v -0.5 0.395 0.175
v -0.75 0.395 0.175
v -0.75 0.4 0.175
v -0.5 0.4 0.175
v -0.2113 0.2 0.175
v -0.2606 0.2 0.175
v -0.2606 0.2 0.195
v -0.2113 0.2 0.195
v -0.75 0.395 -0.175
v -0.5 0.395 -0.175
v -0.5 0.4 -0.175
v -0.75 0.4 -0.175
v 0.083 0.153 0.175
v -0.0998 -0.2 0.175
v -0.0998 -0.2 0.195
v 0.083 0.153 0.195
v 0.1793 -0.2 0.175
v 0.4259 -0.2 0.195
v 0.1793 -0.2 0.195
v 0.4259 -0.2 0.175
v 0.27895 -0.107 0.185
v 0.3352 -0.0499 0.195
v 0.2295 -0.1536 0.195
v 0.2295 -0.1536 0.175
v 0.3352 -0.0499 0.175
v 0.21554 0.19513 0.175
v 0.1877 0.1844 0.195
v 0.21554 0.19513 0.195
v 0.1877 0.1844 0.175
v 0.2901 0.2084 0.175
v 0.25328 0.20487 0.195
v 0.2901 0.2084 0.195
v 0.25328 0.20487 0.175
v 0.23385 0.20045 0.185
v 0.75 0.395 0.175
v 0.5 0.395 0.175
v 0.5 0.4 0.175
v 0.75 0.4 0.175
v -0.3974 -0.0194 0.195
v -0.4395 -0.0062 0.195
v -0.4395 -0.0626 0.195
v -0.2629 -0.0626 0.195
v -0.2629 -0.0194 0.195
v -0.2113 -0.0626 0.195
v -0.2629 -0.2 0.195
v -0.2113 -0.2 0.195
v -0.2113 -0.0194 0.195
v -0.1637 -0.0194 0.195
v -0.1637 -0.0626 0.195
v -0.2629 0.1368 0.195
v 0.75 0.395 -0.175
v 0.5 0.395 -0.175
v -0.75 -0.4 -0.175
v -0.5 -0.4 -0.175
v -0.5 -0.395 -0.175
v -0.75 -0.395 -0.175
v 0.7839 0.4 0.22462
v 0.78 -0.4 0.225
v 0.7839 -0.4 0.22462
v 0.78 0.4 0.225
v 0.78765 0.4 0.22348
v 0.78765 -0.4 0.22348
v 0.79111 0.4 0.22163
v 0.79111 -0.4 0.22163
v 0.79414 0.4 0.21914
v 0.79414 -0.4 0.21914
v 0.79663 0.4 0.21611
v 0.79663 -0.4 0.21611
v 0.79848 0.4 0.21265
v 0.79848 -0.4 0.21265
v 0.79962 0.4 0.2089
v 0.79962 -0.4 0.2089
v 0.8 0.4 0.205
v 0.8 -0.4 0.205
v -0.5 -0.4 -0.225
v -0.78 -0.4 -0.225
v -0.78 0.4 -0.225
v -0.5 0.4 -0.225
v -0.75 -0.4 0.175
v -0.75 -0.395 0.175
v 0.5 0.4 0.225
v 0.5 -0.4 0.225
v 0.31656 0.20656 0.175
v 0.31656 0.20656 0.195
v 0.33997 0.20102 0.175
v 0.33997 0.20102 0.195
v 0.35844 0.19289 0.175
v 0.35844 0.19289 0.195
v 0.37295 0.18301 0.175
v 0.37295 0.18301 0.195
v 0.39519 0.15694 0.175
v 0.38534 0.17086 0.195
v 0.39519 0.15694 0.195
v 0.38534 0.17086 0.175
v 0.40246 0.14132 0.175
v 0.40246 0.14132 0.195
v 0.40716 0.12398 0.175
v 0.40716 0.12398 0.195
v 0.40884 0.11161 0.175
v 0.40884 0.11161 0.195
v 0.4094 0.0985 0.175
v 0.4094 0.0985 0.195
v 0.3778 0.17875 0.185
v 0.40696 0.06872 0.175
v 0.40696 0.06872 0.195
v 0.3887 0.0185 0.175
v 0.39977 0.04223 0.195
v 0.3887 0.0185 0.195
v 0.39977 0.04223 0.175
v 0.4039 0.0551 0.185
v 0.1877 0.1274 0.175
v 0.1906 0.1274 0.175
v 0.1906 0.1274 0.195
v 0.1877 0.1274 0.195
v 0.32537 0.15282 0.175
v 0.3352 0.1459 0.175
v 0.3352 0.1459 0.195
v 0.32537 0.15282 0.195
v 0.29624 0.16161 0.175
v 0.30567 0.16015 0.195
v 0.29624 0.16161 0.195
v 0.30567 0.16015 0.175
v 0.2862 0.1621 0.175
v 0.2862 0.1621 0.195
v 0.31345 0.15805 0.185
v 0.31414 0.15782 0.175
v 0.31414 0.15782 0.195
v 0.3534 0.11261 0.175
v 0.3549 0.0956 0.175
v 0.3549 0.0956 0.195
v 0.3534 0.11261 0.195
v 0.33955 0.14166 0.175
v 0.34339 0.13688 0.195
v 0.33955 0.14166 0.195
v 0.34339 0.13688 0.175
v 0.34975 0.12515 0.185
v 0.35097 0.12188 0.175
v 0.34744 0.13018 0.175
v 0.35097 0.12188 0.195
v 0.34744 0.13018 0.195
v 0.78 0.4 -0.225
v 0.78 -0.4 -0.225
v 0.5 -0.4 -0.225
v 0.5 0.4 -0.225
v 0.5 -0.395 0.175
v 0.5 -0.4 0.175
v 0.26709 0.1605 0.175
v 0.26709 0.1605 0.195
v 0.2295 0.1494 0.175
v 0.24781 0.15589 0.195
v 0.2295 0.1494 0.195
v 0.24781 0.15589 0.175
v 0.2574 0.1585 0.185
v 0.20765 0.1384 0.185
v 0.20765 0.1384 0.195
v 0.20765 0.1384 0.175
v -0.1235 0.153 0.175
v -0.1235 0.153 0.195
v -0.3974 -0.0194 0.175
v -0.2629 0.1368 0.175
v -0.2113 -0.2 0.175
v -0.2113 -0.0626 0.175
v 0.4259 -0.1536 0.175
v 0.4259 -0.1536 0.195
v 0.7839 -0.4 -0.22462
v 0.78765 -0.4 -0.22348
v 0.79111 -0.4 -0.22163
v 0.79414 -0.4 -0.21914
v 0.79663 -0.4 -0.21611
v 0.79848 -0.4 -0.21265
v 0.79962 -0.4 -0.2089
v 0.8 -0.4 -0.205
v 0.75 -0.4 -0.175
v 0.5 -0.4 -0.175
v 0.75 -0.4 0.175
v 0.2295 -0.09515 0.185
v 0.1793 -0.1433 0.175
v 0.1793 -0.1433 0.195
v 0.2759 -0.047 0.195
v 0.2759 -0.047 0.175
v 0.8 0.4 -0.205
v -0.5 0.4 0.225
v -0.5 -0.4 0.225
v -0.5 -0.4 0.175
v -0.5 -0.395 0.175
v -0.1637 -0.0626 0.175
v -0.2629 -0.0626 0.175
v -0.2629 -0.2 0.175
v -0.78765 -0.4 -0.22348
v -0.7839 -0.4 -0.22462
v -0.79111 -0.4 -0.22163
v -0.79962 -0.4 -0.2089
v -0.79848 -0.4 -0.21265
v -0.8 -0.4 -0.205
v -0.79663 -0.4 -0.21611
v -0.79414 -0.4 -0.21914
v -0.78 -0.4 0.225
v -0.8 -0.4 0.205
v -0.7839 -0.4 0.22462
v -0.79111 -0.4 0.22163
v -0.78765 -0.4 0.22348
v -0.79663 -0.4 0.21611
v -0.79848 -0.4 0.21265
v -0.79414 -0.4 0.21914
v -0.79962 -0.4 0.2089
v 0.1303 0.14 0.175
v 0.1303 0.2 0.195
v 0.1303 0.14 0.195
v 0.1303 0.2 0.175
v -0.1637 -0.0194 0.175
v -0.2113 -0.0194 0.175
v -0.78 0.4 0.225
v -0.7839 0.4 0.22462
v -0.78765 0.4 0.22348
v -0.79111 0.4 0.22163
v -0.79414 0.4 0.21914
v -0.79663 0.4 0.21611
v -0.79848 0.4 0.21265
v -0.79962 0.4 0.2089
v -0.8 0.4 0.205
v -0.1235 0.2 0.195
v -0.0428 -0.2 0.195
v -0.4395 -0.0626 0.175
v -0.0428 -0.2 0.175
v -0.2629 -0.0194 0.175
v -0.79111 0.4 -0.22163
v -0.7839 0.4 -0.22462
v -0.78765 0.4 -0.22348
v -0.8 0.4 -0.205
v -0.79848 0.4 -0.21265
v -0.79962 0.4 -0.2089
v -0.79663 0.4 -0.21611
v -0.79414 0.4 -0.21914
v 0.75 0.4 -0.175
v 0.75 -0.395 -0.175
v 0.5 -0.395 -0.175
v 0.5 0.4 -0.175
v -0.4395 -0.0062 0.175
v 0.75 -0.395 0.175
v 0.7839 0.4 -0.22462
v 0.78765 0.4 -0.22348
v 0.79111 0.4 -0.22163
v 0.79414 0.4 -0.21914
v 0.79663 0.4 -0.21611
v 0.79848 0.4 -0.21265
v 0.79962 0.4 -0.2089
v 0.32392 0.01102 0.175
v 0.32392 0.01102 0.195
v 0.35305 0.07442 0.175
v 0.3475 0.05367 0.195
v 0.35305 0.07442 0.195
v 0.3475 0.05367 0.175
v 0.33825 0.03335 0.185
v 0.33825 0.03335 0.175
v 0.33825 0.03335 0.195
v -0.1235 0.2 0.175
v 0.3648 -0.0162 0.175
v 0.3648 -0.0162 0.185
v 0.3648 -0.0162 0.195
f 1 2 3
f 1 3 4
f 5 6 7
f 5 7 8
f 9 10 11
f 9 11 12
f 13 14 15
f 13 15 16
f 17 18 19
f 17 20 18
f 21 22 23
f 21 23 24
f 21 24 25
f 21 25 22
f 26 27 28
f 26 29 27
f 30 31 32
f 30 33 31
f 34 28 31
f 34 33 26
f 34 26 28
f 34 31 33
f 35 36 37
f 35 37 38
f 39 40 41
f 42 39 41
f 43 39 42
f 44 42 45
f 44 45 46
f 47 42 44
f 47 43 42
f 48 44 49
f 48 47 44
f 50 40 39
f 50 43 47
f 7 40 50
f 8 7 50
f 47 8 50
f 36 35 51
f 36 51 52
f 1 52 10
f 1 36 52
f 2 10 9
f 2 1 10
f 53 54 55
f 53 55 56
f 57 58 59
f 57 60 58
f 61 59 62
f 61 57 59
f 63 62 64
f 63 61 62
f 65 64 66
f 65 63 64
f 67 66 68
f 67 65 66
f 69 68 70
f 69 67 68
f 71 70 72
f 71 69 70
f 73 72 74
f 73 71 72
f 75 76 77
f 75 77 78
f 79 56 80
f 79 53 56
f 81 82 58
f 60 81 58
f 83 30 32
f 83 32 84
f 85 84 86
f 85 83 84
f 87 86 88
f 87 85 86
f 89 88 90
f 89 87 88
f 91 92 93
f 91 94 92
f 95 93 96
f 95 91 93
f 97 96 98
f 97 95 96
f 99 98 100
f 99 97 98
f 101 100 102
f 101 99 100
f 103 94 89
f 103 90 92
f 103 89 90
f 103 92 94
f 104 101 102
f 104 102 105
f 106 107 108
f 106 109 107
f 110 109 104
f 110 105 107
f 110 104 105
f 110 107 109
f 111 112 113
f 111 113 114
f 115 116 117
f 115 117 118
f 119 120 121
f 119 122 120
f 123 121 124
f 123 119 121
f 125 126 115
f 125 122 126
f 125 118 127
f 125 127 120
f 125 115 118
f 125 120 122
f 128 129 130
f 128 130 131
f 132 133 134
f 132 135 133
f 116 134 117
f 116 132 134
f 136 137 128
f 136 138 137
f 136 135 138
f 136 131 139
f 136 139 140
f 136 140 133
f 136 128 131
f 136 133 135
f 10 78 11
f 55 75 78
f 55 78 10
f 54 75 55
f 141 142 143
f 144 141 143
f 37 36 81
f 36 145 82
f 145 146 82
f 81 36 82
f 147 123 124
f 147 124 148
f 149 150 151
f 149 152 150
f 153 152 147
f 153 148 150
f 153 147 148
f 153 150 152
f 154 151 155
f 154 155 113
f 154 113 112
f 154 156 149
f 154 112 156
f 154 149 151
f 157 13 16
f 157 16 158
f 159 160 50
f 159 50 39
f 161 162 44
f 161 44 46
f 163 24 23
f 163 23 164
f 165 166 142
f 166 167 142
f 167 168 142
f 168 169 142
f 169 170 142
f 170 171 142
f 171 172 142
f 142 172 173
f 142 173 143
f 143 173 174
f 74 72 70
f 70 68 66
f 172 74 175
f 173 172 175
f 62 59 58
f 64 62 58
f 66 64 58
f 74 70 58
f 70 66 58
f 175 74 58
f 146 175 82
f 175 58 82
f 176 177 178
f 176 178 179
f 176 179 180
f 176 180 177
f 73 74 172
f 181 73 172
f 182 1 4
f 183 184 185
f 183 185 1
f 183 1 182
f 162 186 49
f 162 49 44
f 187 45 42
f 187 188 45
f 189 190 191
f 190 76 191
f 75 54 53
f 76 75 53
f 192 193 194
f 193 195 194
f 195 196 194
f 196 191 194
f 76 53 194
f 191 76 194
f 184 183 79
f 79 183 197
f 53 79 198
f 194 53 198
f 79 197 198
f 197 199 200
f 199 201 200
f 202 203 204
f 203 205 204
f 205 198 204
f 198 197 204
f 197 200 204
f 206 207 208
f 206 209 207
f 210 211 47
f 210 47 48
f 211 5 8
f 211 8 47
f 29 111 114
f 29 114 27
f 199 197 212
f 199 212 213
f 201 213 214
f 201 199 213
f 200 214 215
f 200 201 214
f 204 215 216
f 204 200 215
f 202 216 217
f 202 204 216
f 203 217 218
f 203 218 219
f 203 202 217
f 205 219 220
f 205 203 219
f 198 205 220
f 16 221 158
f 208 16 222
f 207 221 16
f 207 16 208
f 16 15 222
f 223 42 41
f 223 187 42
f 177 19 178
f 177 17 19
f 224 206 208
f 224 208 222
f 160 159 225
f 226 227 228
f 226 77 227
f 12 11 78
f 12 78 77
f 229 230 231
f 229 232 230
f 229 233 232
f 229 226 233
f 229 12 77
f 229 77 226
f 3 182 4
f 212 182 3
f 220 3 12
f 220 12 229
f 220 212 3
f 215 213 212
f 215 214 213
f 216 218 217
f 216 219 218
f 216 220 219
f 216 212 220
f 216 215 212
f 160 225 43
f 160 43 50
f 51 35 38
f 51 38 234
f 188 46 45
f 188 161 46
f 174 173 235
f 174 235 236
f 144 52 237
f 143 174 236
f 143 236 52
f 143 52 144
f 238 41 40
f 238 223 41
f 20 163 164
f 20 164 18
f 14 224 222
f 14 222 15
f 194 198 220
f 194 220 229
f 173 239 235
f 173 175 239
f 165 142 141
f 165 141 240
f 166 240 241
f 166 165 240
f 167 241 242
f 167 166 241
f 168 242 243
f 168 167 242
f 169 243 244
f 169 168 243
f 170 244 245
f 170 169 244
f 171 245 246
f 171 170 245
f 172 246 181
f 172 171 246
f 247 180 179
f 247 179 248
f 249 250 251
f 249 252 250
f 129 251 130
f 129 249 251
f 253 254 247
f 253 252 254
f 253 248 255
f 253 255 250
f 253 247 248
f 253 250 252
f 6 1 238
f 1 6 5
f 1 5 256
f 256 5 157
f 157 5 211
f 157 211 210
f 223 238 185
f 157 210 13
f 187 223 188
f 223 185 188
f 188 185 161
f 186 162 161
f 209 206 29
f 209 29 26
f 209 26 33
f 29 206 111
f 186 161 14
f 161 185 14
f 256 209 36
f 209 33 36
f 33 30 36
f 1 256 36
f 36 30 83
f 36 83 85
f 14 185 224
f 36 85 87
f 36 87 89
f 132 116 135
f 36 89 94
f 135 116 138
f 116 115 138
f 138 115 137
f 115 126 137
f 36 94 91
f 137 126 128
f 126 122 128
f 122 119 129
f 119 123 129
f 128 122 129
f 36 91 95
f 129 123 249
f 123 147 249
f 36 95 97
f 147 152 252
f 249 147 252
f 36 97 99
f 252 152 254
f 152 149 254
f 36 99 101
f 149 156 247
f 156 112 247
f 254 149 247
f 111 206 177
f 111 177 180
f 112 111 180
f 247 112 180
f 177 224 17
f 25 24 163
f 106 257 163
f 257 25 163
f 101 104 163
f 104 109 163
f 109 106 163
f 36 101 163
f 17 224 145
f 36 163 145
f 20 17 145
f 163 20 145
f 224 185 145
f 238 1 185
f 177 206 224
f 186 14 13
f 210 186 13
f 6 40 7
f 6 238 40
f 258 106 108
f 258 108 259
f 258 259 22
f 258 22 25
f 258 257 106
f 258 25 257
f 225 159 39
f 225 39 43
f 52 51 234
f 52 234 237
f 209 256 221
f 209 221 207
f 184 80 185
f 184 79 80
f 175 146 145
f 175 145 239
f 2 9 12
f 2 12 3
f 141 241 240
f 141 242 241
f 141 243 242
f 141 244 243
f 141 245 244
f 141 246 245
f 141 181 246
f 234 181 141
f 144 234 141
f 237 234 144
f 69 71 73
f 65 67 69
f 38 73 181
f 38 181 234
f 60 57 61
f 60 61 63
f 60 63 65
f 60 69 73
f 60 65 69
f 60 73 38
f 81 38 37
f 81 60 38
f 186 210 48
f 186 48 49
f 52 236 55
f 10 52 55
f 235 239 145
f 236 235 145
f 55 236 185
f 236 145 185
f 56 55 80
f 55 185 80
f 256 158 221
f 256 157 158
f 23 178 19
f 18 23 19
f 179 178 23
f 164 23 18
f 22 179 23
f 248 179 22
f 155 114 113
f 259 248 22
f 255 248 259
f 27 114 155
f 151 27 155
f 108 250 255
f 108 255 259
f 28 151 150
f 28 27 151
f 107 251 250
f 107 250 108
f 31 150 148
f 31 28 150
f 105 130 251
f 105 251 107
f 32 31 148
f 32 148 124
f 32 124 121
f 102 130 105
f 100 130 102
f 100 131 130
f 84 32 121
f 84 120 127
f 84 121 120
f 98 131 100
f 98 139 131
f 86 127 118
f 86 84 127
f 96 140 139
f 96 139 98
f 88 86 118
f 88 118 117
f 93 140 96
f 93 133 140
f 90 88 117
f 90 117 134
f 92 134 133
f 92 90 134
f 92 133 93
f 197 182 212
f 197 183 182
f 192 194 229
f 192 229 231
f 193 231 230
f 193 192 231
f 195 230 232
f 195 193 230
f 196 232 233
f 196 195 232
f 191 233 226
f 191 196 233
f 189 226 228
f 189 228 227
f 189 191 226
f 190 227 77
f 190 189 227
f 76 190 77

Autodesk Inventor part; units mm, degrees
ref_plane "YZ Plane" through (0, 0, 0) normal (1, 0, 0) x (0, 1, 0)
ref_plane "XZ Plane" through (0, 0, 0) normal (0, 1, 0) x (-1, 0, 0)
ref_plane "XY Plane" through (0, 0, 0) normal (0, 0, 1) x (1, 0, 0)
sketch "Sketch1" plane through (0, 0, 0) normal (0, 1, 0) x (-1, 0, 0)
  line L0 (0.75, 0.175) -> (-0.75, 0.175)
  line L1 (-0.75, 0.175) -> (-0.75, -0.175)
  line L2 (-0.75, -0.175) -> (0.75, -0.175)
  line L3 (0.75, -0.175) -> (0.75, 0.175)
  line L4 (0.5, 0.175) -> (0.5, 0.225)
  line L5 (0.5, 0.225) -> (0.8, 0.225)
  line L6 (0.8, 0.225) -> (0.8, -0.225)
  line L7 (0.8, -0.225) -> (0.5, -0.225)
  line L8 (0.5, -0.225) -> (0.5, -0.175)
  line L9 (-0.5, 0.175) -> (-0.5, 0.225)
  line L10 (-0.5, 0.225) -> (-0.8, 0.225)
  line L11 (-0.8, 0.225) -> (-0.8, -0.225)
  line L12 (-0.8, -0.225) -> (-0.5, -0.225)
  line L13 (-0.5, -0.175) -> (-0.5, -0.225)
  line L14 (0.5, 0.175) -> (-0.5, 0.175)
  point P0 (0, 0)
  point P1 (0, 0.175)
  point P2 (0.75, 0)
  dimension "d0" = 1.6
  dimension "d1" = 0.05
  dimension "d2" = 0.05
  dimension "d3" = 0.45
  dimension "d4" = 0.3
extrude "Extrusion1" add sketch "Sketch1" along normal mid plane 0.8 contours L0 L4 L5 L6 L7 L8 L2 L3 | L0 L1 L2 L13 L12 L11 L10 L9
extrude "Extrusion2" add sketch "Sketch1" along normal mid plane 0.79 contours L3 L2 L1 L0
sketch "Sketch2" plane through (-0.5, -0.395, 0.175) normal (0, 0, 1) x (1, 0, 0)
  line L0 (0, 0) -> (0, 0.79) projected
  line L1 (1, 0) -> (0, 0) projected
  line L2 (1, 0) -> (1, 0.79) projected
  line L3 (0, 0.79) -> (1, 0.79) projected
  line L4 (0, 0.395) -> (1, 0.395) construction
  line L5 (0.3363, 0.3324) -> (0.2887, 0.3324)
  line L6 (0.2887, 0.3324) -> (0.2887, 0.195)
  line L7 (0.2887, 0.195) -> (0.2371, 0.195)
  line L8 (0.2371, 0.195) -> (0.2371, 0.3324)
  line L9 (0.2371, 0.3324) -> (0.0605, 0.3324)
  line L10 (0.0605, 0.3324) -> (0.0605, 0.3888)
  line L11 (0.0605, 0.3888) -> (0.2394, 0.595)
  line L12 (0.2394, 0.595) -> (0.2887, 0.595)
  line L13 (0.2887, 0.595) -> (0.2887, 0.3756)
  line L14 (0.2887, 0.3756) -> (0.3363, 0.3756)
  line L15 (0.3363, 0.3756) -> (0.3363, 0.3324)
  line L16 (0.2371, 0.3756) -> (0.2371, 0.5318)
  line L17 (0.2371, 0.5318) -> (0.1026, 0.3756)
  line L18 (0.1026, 0.3756) -> (0.2371, 0.3756)
  line L19 (0.6303, 0.535) -> (0.4572, 0.195)
  line L20 (0.4572, 0.195) -> (0.4002, 0.195)
  line L21 (0.4002, 0.195) -> (0.583, 0.548)
  line L22 (0.583, 0.548) -> (0.3765, 0.548)
  line L23 (0.3765, 0.548) -> (0.3765, 0.595)
  line L24 (0.3765, 0.595) -> (0.6303, 0.595)
  line L25 (0.6303, 0.595) -> (0.6303, 0.535)
  line L26 (0.9259, 0.195) -> (0.6793, 0.195)
  line L27 (0.6793, 0.195) -> (0.6793, 0.2517)
  spline S0 degree 2 poles (0.6793, 0.2517) (0.7058, 0.2767) (0.7532, 0.323) (0.7759, 0.348) knots 0 0 0 1 2 2 2
  spline S1 degree 2 poles (0.7759, 0.348) (0.8216, 0.3982) (0.8549, 0.4585) (0.8549, 0.4906) knots 0 0 0 1 2 2 2
  spline S2 degree 2 poles (0.8549, 0.4906) (0.8549, 0.5075) (0.8446, 0.5328) (0.8352, 0.5409) knots 0 0 0 1 2 2 2
  spline S3 degree 2 poles (0.8352, 0.5409) (0.8258, 0.549) (0.8011, 0.5571) (0.7862, 0.5571) knots 0 0 0 1 2 2 2
  spline S4 degree 2 poles (0.7862, 0.5571) (0.772, 0.5571) (0.7428, 0.5499) (0.7295, 0.5444) knots 0 0 0 1 2 2 2
  spline S5 degree 2 poles (0.7295, 0.5444) (0.7182, 0.5399) (0.6971, 0.5269) (0.6906, 0.5224) knots 0 0 0 1 2 2 2
  line L28 (0.6906, 0.5224) -> (0.6877, 0.5224)
  line L29 (0.6877, 0.5224) -> (0.6877, 0.5794)
  spline S6 degree 2 poles (0.6877, 0.5794) (0.7042, 0.5875) (0.7635, 0.6034) (0.7901, 0.6034) knots 0 0 0 1 2 2 2
  spline S7 degree 2 poles (0.7901, 0.6034) (0.8462, 0.6034) (0.9094, 0.5441) (0.9094, 0.4935) knots 0 0 0 1 2 2 2
  spline S8 degree 2 poles (0.9094, 0.4935) (0.9094, 0.4699) (0.8984, 0.4303) (0.8887, 0.4135) knots 0 0 0 1 2 2 2
  spline S9 degree 2 poles (0.8887, 0.4135) (0.8789, 0.396) (0.8507, 0.3616) (0.8352, 0.3451) knots 0 0 0 1 2 2 2
  spline S10 degree 2 poles (0.8352, 0.3451) (0.8099, 0.3175) (0.748, 0.2585) (0.7295, 0.2414) knots 0 0 0 1 2 2 2
  line L30 (0.7295, 0.2414) -> (0.9259, 0.2414)
  line L31 (0.9259, 0.2414) -> (0.9259, 0.195)
  point P0 (0.5, 0.395)
extrude "Extrusion3" add sketch "Sketch2" along normal blind 0.02 contours L5 L6 L7 L8 L9 L10 L11 L12 L13 L14 L15 | L19 L20 L21 L22 L23 L24 L25 | L26 L27 S0 S1 S2 S3 S4 S5 L28 L29 S6 S7 S8 S9 S10 L30 L31
fillet "Fillet1" radius 0.02 4 edges at (-0.8, 0, 0.225) (-0.8, 0, -0.225) (0.8, 0, 0.225) (0.8, 0, -0.225)
equation "\"d2\" = d1"
properties part number "21-1001" material "Copper"
